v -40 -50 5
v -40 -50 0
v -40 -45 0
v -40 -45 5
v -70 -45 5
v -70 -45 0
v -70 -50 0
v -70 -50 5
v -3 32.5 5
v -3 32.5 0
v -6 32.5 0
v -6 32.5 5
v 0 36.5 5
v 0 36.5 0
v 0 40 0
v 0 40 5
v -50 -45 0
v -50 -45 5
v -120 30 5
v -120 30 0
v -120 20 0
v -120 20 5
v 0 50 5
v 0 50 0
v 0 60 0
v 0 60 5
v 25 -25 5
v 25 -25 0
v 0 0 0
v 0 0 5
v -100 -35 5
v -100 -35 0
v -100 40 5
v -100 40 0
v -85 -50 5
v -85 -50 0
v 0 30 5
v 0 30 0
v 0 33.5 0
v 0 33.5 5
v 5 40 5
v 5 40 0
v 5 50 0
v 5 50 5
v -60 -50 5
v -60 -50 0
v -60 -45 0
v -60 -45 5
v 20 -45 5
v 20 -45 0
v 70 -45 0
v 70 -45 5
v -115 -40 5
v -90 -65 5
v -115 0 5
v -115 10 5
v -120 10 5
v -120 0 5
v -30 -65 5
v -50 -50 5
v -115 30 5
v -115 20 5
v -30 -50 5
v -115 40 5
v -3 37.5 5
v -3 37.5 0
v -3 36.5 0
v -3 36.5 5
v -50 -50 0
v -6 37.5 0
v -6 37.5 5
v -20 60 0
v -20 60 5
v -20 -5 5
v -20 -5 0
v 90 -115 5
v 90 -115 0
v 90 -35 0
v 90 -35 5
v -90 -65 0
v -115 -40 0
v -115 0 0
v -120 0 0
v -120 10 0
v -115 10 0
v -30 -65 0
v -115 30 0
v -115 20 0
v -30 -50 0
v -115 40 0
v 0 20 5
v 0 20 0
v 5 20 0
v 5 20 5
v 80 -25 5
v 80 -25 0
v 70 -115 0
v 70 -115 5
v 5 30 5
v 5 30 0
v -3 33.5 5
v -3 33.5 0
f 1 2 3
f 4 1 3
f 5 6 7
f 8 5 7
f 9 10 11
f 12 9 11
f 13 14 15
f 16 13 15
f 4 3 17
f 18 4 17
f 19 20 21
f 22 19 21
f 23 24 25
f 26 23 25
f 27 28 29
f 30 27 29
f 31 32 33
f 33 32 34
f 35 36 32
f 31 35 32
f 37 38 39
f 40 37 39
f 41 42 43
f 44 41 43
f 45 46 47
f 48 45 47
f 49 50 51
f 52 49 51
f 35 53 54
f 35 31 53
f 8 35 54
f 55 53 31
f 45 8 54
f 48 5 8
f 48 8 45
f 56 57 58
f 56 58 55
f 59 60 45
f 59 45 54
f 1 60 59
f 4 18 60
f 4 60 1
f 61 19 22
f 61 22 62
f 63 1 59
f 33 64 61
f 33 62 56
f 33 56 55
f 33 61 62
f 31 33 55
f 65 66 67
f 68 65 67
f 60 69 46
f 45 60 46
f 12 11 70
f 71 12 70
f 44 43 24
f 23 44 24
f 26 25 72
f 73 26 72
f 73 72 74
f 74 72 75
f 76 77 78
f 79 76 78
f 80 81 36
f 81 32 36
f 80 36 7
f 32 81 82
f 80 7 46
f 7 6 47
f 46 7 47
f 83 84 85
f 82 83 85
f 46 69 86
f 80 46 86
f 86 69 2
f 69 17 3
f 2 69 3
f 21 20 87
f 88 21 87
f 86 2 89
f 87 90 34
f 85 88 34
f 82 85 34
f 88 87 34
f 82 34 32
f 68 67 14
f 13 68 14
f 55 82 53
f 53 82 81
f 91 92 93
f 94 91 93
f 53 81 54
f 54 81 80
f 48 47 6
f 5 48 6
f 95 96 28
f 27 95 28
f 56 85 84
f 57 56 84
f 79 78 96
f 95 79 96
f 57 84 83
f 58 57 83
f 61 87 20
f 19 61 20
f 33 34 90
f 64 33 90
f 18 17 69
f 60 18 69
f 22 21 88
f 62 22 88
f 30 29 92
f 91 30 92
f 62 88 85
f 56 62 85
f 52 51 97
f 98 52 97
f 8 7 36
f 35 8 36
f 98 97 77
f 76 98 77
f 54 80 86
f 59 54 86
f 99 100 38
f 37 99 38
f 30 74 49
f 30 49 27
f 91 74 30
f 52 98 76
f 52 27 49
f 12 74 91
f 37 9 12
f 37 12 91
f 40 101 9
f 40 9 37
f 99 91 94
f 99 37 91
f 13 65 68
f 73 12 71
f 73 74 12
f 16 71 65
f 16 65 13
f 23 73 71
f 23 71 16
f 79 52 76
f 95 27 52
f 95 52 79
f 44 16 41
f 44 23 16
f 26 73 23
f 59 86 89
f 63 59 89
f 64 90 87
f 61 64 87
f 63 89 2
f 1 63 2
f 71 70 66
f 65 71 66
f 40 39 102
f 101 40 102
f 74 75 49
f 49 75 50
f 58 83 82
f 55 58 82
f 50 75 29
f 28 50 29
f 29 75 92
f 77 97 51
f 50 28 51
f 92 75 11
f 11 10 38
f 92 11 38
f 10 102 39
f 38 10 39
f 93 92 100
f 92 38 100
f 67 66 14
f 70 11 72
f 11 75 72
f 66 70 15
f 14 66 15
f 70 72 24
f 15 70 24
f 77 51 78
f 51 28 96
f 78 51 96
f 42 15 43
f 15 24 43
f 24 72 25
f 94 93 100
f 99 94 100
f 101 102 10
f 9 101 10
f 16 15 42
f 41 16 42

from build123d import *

# Parameters (mm, degrees)
F1_DEPTH = 5
F3_DEPTH = 5


with BuildPart() as f1:
    # F0 (on Top) → F1 (new body)
    with BuildSketch(Plane.XY):
        Polygon((0, 60), (-20, 60), (-20, -5), (20, -45), (70, -45), (70, -115), (90, -115), (90, -35), (80, -25), (25, -25), (0, 0), (0, 20), (5, 20), (5, 30), (0, 30), (0, 33.5), (-3, 33.5), (-3, 32.5), (-6, 32.5), (-6, 37.5), (-3, 37.5), (-3, 36.5), (0, 36.5), (0, 40), (5, 40), (5, 50), (0, 50), align=None)
    extrude(amount=F1_DEPTH)


with BuildPart() as f3:
    # F2 (on Top) → F3 (new body)
    with BuildSketch(Plane.XY):
        Polygon((-100, 40), (-115, 40), (-115, 30), (-120, 30), (-120, 20), (-115, 20), (-115, 10), (-120, 10), (-120, 0), (-115, 0), (-115, -40), (-90, -65), (-30, -65), (-30, -50), (-40, -50), (-40, -45), (-50, -45), (-50, -50), (-60, -50), (-60, -45), (-70, -45), (-70, -50), (-85, -50), (-100, -35), align=None)
    extrude(amount=F3_DEPTH)


solid = Compound([f1.part, f3.part])
